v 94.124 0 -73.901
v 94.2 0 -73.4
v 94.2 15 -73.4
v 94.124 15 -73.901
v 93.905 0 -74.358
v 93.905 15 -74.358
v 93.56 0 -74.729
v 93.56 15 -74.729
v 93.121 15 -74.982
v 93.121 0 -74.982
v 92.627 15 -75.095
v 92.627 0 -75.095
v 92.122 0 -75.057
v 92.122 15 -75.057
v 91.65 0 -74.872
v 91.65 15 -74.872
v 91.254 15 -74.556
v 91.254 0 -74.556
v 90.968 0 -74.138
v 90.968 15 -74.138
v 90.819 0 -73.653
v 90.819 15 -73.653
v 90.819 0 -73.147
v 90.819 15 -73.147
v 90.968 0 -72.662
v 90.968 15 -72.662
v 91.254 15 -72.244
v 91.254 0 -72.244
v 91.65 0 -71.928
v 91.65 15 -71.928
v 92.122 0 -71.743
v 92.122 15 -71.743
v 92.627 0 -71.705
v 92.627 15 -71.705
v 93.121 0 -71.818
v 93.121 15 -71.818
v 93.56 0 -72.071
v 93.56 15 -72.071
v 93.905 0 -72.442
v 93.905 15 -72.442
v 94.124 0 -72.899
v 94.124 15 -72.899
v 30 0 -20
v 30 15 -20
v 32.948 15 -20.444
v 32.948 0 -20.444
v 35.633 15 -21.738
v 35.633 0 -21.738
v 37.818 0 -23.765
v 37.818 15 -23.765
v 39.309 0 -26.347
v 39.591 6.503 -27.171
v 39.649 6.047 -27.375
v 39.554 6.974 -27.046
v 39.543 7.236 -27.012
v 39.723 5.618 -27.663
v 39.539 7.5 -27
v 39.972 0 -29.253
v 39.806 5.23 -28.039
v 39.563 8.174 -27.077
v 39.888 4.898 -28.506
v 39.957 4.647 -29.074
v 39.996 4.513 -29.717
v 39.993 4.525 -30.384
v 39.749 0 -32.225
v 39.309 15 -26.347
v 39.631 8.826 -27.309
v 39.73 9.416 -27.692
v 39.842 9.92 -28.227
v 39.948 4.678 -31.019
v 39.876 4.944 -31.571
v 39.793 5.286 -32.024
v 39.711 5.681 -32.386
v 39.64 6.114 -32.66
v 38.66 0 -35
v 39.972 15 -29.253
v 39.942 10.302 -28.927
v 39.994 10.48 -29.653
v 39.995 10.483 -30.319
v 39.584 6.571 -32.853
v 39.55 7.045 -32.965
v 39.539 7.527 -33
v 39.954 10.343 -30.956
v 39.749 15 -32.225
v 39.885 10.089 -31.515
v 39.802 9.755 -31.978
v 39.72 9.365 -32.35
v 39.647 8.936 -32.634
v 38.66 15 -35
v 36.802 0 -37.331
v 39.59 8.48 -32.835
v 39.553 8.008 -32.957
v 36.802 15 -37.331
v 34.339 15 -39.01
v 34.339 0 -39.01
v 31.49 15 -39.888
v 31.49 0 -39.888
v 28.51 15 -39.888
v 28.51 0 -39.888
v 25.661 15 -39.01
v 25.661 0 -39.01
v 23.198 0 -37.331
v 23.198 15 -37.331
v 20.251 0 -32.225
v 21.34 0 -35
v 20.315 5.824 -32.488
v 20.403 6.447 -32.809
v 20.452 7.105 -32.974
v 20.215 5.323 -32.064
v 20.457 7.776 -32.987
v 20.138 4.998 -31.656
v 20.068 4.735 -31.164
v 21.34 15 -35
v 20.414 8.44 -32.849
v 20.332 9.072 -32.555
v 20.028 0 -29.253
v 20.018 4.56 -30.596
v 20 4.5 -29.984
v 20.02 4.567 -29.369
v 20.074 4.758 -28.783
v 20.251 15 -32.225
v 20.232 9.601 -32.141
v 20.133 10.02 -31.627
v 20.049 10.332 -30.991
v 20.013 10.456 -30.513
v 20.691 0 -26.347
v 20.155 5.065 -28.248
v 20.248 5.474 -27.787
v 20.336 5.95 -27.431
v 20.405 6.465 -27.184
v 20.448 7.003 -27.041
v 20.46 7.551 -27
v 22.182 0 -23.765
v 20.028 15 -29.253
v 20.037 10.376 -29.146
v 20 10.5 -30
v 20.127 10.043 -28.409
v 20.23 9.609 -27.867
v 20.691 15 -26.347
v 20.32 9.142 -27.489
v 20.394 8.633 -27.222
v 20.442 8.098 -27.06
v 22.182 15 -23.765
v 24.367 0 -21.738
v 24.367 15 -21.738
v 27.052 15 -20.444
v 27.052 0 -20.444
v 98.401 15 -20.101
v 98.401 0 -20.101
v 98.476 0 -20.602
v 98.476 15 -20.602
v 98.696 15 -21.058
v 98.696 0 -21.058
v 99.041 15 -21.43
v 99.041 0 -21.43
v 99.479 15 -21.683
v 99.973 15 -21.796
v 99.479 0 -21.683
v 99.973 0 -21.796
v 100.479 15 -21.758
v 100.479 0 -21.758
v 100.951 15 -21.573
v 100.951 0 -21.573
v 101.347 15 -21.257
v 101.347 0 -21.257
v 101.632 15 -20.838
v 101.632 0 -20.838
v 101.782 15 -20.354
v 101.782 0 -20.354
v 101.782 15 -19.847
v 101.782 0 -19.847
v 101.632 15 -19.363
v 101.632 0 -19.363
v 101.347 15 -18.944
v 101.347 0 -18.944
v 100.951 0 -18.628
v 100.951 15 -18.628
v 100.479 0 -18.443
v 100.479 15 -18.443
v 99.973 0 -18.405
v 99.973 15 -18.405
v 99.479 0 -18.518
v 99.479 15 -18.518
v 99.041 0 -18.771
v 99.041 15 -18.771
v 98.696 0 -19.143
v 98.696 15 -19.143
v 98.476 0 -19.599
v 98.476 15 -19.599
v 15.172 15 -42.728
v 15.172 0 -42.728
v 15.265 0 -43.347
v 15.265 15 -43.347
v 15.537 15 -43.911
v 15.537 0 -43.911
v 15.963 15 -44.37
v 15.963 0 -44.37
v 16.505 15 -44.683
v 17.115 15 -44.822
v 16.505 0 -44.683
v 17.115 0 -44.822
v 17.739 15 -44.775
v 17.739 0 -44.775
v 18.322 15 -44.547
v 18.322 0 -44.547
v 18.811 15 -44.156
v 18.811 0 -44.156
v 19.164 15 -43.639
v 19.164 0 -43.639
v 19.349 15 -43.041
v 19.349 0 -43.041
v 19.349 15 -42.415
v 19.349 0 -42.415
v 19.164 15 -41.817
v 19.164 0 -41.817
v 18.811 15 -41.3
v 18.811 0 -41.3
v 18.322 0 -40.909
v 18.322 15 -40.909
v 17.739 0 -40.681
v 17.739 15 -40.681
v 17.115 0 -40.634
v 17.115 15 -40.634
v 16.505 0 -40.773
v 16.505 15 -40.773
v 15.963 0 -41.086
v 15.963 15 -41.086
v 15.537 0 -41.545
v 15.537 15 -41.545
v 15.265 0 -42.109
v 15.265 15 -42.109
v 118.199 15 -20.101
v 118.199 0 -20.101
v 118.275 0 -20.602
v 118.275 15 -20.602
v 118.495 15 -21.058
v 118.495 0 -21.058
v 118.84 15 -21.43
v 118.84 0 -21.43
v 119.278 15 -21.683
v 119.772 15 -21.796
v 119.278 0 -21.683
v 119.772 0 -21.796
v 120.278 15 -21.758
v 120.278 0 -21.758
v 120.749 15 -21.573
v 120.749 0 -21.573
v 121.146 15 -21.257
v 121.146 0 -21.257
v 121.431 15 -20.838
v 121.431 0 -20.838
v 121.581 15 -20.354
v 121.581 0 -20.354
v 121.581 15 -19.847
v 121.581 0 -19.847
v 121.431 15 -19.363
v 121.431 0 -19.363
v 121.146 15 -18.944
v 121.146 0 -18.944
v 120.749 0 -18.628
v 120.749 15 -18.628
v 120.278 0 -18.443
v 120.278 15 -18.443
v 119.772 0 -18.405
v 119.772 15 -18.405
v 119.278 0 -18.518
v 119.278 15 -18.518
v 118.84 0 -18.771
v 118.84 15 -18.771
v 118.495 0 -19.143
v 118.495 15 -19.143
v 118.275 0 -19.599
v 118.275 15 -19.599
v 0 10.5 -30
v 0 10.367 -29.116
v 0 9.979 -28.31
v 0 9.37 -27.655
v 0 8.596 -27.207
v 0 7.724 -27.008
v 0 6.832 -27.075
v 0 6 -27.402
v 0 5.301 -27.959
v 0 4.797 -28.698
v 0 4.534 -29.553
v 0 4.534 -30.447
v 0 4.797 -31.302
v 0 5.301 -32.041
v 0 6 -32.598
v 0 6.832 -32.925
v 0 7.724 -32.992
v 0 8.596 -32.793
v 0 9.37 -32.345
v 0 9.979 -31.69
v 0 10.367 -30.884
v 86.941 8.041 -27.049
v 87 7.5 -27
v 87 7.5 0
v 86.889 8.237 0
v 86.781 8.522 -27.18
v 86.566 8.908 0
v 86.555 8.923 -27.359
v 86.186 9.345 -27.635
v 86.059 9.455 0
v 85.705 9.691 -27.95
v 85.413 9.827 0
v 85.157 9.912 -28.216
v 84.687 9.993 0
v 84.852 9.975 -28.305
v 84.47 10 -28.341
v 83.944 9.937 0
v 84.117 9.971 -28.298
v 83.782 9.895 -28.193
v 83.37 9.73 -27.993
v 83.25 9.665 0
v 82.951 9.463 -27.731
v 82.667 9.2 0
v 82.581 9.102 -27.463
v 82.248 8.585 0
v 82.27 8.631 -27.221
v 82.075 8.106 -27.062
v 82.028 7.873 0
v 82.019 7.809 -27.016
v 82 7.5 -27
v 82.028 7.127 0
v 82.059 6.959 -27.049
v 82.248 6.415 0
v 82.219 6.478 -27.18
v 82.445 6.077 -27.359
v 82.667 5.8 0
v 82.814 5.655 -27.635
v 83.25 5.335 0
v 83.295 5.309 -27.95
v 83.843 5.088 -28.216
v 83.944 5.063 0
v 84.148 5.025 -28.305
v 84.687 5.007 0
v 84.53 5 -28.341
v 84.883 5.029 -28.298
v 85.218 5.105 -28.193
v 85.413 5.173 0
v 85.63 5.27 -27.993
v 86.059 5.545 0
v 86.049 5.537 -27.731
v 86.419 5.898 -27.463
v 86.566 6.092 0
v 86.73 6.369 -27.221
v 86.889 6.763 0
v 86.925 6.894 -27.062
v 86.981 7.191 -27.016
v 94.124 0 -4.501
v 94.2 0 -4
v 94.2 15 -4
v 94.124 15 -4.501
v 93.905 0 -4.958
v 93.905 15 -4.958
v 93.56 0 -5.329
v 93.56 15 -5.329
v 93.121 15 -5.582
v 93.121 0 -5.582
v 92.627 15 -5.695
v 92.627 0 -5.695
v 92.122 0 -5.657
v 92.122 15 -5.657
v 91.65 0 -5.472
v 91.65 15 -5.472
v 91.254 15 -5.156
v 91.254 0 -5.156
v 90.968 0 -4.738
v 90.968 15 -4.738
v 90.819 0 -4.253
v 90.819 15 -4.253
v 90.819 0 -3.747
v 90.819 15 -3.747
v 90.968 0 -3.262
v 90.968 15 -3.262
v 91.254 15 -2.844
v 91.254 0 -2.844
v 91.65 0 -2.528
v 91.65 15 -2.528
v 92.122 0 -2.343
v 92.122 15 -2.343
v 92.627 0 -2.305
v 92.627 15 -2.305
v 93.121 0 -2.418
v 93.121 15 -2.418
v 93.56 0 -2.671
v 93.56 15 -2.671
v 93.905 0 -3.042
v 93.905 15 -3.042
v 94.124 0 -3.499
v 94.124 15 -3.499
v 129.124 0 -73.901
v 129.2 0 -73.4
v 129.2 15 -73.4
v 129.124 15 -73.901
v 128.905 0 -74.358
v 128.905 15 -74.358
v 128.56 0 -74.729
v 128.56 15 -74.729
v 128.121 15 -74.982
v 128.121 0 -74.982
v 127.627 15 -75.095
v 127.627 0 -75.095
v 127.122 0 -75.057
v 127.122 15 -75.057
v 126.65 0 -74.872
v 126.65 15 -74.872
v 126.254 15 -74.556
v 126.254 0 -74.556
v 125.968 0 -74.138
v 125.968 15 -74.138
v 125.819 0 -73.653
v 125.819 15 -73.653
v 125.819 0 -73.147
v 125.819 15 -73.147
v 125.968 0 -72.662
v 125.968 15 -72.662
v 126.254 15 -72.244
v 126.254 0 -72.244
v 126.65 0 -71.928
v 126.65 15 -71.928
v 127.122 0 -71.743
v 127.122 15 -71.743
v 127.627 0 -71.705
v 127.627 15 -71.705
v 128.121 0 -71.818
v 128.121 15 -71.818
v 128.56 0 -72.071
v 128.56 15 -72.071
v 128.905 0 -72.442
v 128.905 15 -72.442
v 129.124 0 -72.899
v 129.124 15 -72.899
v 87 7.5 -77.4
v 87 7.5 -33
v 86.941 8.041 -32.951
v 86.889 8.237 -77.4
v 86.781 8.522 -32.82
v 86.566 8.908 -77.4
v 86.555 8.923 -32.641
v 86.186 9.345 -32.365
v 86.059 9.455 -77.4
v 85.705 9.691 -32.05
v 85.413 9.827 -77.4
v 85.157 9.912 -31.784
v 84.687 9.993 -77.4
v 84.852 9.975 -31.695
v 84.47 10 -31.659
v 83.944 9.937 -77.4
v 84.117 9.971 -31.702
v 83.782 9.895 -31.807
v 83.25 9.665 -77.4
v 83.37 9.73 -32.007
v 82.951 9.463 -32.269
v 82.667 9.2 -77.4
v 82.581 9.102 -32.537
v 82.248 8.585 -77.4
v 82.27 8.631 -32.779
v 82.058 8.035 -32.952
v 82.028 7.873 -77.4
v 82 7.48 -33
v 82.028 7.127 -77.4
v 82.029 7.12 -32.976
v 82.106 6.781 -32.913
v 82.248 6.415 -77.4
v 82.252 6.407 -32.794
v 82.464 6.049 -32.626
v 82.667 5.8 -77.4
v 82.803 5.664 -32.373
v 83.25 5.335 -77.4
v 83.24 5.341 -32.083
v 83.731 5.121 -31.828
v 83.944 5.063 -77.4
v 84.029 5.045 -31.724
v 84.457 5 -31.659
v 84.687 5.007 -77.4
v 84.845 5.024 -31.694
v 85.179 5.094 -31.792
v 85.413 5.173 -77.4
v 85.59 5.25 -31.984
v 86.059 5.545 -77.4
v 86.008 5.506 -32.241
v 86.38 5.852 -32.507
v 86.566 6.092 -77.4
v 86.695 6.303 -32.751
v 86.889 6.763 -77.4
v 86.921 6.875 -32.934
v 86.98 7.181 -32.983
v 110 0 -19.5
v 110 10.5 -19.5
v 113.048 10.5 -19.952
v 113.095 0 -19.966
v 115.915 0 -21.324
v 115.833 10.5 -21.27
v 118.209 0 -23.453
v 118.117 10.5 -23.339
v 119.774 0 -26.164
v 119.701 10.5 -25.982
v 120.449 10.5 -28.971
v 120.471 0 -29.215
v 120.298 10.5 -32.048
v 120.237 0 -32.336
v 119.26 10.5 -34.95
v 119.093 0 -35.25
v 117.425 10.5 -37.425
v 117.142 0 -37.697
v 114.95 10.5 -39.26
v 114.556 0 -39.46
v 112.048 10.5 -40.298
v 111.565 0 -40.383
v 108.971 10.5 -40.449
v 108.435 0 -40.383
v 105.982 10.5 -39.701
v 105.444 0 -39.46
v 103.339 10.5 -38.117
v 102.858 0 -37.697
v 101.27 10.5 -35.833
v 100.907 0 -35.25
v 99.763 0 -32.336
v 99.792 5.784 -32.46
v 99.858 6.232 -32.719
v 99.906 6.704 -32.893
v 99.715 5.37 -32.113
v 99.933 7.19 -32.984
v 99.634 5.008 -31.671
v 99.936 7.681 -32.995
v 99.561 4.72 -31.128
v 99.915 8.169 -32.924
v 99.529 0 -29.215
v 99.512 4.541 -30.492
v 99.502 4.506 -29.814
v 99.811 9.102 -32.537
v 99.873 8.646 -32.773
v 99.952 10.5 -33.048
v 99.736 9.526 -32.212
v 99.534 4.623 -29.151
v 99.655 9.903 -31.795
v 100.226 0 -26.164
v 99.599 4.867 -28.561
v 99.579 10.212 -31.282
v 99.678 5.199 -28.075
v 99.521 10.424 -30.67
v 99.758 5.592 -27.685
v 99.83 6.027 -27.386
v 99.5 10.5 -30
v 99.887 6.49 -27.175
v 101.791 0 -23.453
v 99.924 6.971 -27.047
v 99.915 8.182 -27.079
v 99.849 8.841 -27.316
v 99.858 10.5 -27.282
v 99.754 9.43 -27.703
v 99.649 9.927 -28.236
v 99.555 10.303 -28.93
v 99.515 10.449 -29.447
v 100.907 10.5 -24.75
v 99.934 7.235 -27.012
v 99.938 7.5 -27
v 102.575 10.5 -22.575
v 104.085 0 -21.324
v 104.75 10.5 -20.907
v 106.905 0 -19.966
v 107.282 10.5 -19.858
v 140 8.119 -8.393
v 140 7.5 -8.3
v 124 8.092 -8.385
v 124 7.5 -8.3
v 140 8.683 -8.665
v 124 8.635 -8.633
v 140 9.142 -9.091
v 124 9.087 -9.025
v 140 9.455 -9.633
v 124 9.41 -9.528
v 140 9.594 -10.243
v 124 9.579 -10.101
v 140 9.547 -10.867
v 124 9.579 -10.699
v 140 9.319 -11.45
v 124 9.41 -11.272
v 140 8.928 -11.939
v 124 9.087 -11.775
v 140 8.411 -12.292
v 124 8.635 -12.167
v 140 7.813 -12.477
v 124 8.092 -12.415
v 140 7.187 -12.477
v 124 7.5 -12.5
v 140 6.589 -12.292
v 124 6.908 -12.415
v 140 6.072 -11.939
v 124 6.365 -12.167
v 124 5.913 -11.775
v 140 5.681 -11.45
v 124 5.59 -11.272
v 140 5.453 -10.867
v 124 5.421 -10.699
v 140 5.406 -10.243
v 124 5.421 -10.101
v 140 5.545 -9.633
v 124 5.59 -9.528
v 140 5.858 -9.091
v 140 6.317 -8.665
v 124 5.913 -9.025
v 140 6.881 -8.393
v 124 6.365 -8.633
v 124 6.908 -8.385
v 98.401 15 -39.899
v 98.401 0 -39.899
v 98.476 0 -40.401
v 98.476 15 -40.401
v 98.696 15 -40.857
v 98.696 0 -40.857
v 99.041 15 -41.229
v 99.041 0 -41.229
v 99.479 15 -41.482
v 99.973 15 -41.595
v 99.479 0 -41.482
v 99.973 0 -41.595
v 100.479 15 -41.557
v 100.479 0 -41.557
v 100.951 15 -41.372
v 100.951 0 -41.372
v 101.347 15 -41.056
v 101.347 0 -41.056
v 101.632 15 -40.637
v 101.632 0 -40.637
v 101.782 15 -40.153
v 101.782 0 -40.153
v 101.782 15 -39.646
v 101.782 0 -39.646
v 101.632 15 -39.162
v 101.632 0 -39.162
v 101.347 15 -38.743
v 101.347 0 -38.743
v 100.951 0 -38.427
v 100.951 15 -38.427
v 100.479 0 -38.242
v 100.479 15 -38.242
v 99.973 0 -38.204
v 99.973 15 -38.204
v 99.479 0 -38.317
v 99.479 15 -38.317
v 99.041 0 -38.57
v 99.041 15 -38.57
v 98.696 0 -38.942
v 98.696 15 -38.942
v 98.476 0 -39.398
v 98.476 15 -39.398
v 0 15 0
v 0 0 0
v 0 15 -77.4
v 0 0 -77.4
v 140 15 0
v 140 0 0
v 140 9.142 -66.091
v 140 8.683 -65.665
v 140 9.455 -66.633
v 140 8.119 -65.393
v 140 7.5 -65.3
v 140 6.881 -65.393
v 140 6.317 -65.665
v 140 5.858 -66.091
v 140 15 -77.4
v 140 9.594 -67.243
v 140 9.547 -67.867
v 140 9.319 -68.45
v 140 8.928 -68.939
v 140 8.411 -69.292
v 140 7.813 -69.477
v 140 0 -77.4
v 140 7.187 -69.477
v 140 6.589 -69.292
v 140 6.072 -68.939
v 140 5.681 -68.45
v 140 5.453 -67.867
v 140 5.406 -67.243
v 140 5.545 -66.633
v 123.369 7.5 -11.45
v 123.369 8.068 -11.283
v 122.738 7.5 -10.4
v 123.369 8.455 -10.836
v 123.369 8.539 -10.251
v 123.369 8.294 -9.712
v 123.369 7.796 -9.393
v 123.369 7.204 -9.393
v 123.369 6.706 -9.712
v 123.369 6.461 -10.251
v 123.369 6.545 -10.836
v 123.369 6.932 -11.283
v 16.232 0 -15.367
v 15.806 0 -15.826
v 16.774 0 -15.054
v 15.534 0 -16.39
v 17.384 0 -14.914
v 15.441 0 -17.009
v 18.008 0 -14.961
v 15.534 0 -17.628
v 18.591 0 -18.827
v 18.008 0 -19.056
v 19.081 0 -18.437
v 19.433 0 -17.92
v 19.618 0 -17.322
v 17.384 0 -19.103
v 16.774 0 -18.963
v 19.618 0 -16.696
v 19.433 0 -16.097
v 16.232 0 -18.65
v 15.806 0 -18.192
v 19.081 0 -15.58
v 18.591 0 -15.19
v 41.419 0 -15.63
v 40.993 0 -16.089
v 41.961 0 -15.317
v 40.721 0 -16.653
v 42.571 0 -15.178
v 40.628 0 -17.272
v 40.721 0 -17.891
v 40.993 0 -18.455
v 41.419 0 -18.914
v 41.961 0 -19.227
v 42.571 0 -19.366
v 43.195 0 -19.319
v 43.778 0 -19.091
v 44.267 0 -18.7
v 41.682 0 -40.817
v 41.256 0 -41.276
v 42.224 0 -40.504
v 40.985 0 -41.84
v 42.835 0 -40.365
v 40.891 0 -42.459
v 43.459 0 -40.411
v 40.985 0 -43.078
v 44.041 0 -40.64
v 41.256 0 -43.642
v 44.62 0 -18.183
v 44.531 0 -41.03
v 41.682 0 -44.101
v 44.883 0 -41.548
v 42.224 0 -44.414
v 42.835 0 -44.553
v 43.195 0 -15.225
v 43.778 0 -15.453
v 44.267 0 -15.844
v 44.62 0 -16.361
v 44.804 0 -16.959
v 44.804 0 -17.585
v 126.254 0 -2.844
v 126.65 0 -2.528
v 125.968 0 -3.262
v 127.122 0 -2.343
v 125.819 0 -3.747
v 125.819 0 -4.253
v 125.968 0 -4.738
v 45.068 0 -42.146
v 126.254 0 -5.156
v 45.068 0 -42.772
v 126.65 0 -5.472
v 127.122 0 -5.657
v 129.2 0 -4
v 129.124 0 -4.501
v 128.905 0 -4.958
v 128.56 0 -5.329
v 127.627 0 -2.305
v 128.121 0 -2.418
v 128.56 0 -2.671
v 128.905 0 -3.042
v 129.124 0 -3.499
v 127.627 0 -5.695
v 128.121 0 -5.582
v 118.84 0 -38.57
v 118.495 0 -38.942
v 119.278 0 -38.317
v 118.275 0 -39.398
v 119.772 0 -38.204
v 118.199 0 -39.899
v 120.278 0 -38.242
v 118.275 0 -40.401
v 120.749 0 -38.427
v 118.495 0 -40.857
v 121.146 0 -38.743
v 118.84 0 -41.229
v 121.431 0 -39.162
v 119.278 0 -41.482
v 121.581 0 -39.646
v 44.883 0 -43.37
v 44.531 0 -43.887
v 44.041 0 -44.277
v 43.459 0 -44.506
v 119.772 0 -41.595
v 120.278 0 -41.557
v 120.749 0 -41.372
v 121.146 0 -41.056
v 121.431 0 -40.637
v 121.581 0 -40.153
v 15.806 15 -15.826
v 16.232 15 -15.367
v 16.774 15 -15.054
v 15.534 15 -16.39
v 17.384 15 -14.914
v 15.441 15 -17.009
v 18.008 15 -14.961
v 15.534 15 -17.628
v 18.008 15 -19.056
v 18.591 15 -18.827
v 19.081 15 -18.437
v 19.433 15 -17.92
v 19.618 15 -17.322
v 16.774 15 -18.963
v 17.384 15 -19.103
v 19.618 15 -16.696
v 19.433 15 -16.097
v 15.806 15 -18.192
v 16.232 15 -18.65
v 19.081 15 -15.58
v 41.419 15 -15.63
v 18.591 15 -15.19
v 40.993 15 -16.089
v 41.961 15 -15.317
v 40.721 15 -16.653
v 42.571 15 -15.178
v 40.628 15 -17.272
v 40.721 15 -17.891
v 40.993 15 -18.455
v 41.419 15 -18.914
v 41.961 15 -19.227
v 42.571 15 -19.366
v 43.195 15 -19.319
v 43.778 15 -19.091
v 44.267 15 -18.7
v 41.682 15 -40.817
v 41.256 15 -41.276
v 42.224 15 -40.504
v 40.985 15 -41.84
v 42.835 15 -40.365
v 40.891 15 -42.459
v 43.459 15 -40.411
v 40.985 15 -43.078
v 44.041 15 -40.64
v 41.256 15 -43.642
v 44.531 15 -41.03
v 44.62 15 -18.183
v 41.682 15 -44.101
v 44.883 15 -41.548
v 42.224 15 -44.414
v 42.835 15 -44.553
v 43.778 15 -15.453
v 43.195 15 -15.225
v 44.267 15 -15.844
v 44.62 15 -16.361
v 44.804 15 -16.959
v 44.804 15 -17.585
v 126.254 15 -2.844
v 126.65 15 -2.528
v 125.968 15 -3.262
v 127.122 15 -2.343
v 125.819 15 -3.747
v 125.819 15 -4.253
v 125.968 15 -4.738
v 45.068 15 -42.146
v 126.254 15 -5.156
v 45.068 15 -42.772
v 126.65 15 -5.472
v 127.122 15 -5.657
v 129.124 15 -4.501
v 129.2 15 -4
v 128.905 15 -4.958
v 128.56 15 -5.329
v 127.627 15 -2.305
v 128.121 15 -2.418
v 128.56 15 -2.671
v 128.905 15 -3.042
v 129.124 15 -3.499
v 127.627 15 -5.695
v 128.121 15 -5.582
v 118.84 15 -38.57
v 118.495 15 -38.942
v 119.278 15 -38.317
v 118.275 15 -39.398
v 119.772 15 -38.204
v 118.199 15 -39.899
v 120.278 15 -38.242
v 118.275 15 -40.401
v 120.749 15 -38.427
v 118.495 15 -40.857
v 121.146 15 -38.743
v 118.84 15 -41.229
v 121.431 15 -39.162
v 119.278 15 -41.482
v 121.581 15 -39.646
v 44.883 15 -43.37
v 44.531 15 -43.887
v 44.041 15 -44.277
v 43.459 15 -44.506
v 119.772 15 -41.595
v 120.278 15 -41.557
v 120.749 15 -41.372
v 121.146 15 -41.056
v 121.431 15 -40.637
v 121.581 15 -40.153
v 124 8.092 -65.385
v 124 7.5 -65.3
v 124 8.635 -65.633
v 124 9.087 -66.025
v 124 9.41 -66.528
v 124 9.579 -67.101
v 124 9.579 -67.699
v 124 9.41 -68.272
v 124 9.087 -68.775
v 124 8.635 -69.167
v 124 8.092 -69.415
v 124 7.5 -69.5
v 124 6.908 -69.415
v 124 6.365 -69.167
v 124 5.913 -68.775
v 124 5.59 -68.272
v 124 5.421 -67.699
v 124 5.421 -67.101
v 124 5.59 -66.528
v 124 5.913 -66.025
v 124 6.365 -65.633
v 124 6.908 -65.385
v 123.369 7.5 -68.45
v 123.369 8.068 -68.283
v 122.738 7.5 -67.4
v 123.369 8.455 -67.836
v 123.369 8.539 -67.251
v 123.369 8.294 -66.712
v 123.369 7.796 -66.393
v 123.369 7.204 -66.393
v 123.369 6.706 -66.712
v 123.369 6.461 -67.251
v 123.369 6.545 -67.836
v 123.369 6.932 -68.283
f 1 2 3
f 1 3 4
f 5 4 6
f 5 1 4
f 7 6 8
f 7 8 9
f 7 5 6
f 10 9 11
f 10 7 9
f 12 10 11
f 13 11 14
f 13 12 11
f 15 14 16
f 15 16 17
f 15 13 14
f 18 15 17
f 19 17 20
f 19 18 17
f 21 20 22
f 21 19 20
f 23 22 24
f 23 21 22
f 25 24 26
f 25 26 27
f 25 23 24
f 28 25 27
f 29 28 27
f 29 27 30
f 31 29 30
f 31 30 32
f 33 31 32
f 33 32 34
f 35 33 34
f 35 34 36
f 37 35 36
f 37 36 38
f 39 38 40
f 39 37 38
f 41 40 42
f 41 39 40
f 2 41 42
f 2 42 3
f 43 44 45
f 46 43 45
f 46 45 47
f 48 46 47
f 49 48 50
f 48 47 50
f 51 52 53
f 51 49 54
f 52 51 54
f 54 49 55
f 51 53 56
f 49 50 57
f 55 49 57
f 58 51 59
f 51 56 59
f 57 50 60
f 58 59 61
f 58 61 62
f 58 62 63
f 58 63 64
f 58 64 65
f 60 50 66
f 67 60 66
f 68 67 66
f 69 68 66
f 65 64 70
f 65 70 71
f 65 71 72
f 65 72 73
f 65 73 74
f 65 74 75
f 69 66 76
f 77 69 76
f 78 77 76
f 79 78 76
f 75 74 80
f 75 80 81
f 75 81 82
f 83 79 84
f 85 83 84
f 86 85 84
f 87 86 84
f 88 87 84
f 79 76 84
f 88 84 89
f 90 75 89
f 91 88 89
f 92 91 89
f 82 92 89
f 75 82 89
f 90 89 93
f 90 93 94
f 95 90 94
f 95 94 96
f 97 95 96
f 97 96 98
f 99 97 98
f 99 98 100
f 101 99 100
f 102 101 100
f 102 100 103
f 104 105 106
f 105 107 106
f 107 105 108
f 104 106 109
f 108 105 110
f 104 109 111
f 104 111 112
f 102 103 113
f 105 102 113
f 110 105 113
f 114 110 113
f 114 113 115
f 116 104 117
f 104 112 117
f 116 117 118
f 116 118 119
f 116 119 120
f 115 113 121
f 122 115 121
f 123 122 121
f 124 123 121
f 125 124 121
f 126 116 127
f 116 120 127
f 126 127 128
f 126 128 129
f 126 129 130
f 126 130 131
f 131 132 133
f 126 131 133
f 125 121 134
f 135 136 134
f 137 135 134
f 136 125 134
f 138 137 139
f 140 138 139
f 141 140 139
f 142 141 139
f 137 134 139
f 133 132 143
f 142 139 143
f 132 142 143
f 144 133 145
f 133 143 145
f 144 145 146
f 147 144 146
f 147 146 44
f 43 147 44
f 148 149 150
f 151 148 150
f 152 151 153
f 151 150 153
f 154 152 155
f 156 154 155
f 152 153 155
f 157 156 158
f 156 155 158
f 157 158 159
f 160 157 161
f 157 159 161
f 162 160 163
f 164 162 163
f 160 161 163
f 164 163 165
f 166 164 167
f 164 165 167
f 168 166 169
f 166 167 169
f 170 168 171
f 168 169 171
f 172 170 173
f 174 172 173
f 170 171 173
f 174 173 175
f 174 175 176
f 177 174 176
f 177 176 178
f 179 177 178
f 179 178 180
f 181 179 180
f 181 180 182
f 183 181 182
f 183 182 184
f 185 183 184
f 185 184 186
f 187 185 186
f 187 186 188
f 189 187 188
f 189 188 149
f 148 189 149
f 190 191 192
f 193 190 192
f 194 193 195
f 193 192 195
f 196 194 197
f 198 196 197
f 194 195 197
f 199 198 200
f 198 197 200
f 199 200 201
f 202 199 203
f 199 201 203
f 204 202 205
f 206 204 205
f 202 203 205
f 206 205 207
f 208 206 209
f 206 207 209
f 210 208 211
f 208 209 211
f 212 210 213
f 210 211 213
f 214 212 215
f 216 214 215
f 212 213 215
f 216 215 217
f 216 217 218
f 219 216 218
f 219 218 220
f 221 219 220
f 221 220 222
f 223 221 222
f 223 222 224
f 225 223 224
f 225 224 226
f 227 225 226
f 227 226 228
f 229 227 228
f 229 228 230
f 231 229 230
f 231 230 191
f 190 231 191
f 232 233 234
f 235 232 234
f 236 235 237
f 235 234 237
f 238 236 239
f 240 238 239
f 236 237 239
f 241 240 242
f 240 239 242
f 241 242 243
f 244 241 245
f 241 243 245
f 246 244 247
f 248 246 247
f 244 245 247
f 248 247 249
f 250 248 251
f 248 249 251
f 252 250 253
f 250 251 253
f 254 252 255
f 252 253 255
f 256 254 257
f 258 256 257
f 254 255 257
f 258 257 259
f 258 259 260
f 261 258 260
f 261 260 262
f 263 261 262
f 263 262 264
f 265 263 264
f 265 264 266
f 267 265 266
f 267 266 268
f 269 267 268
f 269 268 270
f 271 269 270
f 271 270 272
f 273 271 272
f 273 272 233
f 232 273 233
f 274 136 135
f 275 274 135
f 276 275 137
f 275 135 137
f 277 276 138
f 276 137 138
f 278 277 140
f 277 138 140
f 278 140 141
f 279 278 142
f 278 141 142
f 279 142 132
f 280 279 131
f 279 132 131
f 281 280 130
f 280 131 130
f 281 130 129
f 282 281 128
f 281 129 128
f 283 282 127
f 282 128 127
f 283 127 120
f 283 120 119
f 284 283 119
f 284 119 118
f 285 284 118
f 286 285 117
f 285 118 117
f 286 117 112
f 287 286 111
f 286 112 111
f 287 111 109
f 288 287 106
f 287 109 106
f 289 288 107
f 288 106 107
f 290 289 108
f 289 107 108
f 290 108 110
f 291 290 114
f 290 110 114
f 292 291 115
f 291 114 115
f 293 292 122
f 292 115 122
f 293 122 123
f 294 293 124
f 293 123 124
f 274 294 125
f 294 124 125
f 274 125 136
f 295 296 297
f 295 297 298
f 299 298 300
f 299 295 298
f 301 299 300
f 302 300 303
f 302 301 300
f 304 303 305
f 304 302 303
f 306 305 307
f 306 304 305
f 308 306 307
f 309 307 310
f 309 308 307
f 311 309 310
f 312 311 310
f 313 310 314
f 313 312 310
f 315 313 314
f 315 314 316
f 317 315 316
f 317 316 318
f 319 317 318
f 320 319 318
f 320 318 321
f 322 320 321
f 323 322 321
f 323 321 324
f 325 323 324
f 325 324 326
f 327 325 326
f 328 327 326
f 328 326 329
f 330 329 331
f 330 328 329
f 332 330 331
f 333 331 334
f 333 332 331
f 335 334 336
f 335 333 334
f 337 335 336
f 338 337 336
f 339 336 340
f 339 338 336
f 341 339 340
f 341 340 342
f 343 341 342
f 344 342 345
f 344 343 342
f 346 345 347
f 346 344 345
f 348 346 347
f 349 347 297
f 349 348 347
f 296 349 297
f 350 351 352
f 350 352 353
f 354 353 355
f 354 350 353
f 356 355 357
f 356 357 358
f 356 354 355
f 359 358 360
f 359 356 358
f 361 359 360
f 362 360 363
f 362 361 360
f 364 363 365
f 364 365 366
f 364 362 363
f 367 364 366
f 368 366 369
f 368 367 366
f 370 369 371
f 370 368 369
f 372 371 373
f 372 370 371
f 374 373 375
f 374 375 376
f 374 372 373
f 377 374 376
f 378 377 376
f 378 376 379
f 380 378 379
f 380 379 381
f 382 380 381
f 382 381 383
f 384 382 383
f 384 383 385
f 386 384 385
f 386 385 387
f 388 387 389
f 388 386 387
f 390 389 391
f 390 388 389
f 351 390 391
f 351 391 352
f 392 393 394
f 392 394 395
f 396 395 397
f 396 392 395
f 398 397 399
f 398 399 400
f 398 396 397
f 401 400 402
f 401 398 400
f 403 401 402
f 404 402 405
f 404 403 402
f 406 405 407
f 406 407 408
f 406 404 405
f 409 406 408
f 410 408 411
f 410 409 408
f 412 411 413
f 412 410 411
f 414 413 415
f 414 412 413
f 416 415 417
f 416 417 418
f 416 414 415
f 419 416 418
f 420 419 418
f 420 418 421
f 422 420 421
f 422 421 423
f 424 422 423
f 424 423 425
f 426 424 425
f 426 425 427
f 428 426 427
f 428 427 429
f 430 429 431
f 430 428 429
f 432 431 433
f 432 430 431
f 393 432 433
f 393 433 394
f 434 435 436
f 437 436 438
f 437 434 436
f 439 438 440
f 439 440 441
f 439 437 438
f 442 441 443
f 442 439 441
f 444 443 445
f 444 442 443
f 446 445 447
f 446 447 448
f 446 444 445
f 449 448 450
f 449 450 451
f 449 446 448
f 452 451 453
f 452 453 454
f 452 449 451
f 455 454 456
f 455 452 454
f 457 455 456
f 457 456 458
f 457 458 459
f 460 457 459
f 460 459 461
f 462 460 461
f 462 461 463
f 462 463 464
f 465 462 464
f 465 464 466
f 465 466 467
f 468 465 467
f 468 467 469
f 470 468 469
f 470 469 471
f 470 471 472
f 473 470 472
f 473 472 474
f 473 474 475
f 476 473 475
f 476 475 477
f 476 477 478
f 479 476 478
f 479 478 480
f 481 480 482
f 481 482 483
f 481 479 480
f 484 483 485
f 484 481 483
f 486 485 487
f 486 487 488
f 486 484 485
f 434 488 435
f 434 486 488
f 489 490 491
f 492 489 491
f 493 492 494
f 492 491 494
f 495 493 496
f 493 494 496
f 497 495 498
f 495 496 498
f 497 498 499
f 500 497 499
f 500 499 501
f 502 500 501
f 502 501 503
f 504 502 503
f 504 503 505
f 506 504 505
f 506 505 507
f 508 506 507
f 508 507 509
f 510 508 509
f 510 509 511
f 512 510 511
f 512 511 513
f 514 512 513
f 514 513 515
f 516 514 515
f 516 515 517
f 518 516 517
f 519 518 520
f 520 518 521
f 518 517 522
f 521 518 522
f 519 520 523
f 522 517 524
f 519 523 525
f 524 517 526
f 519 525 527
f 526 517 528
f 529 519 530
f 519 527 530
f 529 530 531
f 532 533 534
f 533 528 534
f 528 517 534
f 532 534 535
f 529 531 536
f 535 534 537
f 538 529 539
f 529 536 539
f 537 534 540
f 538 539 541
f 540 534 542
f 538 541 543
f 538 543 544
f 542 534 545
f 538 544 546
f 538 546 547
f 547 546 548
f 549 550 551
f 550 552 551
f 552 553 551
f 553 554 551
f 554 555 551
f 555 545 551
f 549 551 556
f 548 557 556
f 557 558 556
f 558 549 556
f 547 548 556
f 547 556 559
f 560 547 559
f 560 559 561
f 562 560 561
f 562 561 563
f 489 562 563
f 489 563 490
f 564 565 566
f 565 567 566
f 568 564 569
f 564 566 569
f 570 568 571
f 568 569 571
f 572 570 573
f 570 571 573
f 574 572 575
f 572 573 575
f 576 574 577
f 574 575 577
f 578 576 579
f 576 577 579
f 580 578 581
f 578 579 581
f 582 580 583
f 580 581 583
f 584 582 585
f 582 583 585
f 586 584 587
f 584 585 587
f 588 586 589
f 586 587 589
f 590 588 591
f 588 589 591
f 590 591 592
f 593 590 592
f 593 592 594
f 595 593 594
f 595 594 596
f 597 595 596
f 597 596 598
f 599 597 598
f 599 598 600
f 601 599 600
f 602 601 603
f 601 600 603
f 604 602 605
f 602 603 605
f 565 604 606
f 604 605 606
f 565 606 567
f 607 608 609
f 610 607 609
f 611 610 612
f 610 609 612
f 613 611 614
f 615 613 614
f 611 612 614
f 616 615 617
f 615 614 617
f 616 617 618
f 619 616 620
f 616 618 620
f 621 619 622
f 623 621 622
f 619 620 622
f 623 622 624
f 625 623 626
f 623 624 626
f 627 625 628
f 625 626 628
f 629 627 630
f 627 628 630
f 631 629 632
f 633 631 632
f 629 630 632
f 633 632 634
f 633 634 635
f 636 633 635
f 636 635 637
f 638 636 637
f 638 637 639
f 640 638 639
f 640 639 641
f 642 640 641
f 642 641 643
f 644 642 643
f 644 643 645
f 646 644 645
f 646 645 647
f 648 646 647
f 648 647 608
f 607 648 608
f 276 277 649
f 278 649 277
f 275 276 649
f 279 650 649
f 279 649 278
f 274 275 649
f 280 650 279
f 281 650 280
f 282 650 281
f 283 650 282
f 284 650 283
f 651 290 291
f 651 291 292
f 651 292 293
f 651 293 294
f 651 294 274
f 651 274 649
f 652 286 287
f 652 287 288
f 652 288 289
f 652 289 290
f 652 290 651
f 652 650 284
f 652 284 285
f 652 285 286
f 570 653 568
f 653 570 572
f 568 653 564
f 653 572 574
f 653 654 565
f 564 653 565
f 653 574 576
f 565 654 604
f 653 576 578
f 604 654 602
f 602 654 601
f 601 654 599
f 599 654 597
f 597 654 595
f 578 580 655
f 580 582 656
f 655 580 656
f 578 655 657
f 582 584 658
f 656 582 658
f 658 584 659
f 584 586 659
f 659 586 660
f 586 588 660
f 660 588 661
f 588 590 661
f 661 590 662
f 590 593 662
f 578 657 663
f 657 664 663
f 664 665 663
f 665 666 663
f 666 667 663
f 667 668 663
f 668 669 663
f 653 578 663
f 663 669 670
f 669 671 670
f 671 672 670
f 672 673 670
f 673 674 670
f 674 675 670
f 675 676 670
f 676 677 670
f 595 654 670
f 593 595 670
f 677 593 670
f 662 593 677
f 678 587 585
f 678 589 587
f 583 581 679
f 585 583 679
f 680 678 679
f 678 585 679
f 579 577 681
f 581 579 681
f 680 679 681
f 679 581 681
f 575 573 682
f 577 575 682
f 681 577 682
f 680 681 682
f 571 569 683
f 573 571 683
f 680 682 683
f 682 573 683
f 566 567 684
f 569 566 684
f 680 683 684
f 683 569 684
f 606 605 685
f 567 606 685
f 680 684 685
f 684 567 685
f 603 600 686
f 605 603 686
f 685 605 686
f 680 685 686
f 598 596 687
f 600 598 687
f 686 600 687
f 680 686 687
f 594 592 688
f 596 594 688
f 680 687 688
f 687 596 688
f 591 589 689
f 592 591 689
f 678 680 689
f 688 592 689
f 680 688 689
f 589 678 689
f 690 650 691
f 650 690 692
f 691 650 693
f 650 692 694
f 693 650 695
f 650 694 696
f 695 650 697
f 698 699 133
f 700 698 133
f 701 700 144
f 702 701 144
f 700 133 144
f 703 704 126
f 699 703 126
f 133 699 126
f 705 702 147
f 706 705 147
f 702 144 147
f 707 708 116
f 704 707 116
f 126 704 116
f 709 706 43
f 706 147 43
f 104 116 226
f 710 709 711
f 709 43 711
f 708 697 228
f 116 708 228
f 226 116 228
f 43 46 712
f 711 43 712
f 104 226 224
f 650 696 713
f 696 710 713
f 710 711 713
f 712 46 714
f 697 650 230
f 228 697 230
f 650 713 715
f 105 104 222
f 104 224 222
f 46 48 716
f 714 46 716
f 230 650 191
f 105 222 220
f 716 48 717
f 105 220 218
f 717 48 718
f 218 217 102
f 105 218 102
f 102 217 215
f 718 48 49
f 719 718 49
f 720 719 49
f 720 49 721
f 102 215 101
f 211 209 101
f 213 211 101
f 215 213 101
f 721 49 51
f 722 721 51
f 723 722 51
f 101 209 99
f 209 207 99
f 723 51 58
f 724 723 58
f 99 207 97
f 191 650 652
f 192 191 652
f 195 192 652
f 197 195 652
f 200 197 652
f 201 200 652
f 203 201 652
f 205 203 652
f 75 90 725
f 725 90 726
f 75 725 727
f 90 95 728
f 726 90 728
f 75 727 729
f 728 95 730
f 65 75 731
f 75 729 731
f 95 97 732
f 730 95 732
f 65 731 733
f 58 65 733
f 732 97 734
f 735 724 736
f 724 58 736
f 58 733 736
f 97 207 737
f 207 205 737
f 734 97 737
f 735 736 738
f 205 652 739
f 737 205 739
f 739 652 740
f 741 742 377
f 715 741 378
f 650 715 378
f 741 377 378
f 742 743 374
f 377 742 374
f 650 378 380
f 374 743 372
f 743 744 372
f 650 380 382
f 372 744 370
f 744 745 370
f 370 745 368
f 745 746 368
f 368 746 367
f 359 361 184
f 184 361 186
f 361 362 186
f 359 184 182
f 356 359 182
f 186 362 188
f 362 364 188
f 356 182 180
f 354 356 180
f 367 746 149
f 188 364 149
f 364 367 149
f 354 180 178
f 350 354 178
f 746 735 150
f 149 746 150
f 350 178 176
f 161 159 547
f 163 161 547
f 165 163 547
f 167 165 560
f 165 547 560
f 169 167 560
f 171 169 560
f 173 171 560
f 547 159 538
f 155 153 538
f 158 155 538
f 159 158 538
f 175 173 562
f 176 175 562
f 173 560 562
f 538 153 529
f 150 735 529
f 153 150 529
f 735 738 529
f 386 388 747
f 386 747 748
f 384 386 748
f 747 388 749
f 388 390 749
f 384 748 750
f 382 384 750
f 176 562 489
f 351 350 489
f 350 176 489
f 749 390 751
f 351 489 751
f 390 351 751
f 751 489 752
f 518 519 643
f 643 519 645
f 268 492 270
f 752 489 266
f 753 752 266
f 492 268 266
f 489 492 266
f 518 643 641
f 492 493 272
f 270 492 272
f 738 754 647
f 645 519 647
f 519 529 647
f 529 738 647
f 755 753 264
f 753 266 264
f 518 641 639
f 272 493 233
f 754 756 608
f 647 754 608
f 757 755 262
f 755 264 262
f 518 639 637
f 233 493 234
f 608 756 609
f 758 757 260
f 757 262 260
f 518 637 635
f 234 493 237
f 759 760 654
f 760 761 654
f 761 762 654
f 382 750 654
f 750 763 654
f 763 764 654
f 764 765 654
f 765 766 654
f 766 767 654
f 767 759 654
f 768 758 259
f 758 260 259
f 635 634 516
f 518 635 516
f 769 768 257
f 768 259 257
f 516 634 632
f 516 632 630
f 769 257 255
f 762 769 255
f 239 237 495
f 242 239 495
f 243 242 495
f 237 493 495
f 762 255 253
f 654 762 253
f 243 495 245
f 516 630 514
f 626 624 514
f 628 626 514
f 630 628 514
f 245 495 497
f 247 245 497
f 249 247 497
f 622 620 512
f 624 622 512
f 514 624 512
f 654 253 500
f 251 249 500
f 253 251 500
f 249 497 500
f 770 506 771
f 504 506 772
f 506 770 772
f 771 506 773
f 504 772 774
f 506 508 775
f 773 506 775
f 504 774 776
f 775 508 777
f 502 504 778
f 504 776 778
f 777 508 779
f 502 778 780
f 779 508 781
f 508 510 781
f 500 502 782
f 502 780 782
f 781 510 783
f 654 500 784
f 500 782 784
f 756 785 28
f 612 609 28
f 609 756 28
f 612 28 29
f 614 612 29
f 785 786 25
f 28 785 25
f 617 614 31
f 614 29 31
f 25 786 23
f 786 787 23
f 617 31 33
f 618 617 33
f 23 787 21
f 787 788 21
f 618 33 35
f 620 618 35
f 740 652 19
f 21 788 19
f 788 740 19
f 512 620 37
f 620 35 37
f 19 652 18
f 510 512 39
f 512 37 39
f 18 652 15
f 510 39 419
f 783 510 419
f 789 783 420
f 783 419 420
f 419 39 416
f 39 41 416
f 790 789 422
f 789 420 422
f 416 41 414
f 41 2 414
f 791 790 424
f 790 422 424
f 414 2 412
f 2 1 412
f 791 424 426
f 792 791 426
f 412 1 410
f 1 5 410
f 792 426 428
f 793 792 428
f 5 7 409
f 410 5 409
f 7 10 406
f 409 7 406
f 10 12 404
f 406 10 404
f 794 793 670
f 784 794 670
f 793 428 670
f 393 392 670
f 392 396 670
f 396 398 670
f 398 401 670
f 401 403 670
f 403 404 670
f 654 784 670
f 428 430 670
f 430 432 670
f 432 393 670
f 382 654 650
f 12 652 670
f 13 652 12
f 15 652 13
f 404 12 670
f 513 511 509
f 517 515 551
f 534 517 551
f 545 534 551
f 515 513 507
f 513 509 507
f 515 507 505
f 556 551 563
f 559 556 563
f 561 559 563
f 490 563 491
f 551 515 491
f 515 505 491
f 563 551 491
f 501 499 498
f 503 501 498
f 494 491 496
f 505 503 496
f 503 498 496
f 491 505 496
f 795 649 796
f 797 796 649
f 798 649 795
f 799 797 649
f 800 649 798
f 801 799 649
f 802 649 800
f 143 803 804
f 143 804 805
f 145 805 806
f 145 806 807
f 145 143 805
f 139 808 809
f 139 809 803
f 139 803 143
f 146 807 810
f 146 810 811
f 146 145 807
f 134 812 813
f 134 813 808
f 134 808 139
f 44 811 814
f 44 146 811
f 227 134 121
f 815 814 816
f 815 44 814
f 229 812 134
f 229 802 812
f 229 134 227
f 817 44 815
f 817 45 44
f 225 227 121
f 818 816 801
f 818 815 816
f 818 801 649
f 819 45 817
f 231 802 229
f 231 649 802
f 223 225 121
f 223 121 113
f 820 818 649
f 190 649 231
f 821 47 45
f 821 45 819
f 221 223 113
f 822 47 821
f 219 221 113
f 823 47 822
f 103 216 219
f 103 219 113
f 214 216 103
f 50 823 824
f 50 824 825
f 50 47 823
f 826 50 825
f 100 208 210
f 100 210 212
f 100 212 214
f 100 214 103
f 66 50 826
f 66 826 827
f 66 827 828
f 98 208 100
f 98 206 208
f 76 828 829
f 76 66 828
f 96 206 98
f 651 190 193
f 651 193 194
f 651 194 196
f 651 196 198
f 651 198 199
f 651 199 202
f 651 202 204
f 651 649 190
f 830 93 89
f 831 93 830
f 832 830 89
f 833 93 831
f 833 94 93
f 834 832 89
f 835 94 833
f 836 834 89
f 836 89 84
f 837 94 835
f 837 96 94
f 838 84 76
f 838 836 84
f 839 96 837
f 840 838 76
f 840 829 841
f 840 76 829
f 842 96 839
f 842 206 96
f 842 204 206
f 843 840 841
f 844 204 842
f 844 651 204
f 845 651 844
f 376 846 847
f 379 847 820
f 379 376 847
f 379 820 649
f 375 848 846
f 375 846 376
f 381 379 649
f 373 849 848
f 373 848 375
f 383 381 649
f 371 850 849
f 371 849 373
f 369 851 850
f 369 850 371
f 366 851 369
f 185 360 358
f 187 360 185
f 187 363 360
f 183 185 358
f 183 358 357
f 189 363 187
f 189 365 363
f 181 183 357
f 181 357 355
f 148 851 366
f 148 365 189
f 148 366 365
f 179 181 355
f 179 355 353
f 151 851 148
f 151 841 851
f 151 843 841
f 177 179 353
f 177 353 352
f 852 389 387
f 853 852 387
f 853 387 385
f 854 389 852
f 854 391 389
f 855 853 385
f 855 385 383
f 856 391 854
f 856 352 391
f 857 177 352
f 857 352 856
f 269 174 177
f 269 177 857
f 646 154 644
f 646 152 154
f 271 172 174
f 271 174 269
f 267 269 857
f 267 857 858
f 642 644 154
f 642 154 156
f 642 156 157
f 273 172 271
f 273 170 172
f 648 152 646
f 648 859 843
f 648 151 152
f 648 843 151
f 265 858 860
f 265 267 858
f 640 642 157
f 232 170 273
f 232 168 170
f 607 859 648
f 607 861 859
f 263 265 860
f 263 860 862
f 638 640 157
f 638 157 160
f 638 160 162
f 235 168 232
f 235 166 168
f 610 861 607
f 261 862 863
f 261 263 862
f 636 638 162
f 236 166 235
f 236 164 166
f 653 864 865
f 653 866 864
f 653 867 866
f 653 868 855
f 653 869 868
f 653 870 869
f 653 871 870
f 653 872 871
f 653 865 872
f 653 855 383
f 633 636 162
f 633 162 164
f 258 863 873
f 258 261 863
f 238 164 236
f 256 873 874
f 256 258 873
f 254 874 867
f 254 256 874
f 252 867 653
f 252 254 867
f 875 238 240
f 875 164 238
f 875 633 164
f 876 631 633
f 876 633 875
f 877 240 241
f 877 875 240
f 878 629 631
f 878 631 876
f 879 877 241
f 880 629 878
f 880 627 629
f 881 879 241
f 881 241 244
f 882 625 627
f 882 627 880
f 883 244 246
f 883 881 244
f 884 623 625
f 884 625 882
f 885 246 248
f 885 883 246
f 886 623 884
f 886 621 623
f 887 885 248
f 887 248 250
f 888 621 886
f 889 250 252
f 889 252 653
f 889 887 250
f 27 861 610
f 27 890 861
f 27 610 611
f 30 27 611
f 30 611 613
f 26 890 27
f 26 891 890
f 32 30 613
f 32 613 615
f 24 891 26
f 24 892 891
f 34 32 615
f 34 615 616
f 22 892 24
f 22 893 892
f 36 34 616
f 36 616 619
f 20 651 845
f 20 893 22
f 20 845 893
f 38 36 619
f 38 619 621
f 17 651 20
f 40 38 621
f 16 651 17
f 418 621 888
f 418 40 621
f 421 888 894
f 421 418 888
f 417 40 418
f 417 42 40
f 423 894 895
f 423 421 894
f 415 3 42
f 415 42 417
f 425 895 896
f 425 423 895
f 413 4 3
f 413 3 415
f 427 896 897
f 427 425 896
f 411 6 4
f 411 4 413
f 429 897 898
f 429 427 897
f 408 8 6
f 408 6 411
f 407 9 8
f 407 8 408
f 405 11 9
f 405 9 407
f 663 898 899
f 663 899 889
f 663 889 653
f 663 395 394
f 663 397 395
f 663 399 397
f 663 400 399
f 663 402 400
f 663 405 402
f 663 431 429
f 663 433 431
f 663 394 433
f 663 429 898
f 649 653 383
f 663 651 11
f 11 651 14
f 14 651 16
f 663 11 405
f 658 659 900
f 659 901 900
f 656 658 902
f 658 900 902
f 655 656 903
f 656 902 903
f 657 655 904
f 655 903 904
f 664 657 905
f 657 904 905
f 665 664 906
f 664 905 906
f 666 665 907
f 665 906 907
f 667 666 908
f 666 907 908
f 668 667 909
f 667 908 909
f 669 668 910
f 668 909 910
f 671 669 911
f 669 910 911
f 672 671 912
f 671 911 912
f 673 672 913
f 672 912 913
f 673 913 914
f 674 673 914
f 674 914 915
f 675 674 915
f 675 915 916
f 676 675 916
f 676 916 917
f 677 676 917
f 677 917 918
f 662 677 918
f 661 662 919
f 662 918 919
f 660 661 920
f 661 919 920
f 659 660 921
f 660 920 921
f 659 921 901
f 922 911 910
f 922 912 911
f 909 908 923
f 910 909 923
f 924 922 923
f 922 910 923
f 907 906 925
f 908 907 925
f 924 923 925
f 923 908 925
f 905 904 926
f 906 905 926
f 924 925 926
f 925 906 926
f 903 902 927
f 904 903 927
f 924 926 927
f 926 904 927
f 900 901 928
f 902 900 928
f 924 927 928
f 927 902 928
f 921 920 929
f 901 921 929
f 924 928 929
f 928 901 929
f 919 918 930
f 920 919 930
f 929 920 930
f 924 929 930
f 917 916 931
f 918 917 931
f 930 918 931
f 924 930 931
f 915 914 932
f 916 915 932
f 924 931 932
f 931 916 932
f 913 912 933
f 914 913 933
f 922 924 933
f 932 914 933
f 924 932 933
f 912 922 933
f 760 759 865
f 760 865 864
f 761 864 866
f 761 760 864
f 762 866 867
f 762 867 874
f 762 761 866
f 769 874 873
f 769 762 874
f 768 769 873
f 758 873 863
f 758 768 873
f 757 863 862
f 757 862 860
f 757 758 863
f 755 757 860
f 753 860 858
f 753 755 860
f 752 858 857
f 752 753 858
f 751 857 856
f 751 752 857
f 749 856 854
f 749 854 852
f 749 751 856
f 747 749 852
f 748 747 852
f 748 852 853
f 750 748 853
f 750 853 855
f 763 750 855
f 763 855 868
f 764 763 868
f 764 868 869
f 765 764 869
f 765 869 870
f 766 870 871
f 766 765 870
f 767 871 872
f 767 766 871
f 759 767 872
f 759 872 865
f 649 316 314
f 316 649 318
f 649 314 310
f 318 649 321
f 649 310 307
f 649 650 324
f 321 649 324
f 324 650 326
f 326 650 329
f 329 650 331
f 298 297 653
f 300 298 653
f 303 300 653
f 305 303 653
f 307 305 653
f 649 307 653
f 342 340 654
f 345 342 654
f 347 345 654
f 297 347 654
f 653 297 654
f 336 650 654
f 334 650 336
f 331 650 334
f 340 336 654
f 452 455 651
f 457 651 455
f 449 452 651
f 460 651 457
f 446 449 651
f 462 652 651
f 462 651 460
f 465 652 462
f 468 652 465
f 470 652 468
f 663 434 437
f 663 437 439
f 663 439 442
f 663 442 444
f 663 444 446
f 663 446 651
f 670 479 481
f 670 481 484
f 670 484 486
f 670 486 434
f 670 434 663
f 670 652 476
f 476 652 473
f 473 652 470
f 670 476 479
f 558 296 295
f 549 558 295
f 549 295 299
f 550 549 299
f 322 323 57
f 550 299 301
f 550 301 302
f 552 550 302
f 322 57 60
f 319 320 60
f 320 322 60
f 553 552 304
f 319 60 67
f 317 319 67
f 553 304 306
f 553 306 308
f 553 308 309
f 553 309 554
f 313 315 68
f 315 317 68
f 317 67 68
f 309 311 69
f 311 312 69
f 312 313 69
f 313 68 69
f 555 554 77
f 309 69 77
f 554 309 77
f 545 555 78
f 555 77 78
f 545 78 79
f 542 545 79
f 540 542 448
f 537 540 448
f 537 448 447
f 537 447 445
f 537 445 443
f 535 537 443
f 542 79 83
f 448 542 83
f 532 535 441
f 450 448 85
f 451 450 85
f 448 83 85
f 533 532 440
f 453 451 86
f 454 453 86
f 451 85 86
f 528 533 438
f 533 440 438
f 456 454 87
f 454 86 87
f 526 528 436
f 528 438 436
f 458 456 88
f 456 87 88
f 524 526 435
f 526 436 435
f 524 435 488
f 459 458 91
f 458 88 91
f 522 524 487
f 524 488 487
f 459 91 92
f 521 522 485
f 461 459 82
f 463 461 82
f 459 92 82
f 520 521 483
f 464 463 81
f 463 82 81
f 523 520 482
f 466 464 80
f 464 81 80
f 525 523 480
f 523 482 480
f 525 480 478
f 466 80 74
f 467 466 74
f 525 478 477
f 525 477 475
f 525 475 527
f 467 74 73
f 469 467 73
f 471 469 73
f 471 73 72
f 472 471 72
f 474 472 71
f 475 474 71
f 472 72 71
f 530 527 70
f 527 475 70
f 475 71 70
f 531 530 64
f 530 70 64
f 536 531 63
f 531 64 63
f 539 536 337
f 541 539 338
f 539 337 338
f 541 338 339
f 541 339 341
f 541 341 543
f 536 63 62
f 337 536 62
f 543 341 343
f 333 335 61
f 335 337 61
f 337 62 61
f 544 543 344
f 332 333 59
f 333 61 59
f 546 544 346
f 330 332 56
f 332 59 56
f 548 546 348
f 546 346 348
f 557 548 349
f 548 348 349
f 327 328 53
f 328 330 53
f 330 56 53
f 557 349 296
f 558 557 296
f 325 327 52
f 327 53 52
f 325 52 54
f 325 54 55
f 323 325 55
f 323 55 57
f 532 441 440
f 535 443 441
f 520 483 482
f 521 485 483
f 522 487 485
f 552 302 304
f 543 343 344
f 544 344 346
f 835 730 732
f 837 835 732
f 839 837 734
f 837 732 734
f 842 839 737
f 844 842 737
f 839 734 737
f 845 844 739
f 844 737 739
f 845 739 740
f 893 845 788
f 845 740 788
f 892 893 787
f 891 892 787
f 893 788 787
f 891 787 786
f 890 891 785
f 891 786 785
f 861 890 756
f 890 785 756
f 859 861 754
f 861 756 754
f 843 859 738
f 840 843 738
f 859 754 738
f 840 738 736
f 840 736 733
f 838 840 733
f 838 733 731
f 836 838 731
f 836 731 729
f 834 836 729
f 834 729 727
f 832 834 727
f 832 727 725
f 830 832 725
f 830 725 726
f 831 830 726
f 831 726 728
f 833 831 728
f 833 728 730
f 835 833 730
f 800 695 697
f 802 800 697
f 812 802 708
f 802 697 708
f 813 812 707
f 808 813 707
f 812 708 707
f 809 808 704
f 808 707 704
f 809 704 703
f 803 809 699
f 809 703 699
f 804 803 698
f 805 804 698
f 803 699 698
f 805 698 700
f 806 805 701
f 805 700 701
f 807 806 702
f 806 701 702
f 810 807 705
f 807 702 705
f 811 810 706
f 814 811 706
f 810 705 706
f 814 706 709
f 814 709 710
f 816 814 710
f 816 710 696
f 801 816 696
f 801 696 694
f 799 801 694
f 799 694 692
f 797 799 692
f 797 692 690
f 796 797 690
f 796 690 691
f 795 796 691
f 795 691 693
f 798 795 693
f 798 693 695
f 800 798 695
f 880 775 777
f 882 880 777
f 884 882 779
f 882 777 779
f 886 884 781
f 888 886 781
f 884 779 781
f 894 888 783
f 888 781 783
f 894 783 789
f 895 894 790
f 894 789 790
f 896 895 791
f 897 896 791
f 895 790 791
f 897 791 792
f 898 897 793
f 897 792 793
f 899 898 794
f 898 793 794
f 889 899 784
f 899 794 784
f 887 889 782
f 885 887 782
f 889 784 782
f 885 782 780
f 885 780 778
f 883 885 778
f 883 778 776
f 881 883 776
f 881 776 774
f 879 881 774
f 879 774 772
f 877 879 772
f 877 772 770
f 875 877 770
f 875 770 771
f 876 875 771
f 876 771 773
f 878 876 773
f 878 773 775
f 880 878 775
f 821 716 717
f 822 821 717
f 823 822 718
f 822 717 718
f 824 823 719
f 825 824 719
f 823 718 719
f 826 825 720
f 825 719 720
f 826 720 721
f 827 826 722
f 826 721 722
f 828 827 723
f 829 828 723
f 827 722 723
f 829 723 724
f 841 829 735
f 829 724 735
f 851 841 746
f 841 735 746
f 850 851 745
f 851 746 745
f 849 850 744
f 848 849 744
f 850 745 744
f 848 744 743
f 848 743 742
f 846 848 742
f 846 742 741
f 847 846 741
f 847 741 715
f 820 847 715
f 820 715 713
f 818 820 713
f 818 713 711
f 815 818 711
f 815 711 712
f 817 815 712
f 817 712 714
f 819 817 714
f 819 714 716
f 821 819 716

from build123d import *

# Parameters (mm, degrees)
SKETCH_1_W                 = 140
SKETCH_1_H                 = 77.4
EXTRUDE_1_DEPTH            = 15
SKETCH_6_R                 = 10.5
CUT_EXTRUDE_4_DEPTH        = 161.315345491
M5X0_8_1_D                 = 4.2
M5X0_8_1_DEPTH             = 16
M5X0_8_1_TIP               = 1.2618073
SKETCH_9_R                 = 10
CUT_EXTRUDE_6_DEPTH        = 161.67283529
M5X0_8_2_D                 = 4.2
HOLE_WIZARD_M3_1_D         = 3.4
M6X1_0_START               = -77.4
M6X1_0_3_OUTLINE_R         = 2.5
M6X1_0_3_DEPTH             = 77.4
HOLE_WIZARD_M3_2_OUTLINE_R = 1.7
HOLE_WIZARD_M3_2_DEPTH     = 15
M7X1_0_4_OUTLINE_W         = 3
M7X1_0_4_OUTLINE_H         = 20.46087378
CUT_EXTRUDE_7_REACH        = 137.336
SKETCH_27_R                = 3


# Read off the part's stored shape, not the designer's step: M6x1.0 ねじ穴3, M3 すきま穴2, M7x1.0 ねじ穴4
with BuildPart() as part:
    # ｽｹｯﾁ1 → ﾎﾞｽ - 押し出し1 (new body)
    with BuildSketch(Plane(origin=(0, 0, 0), x_dir=(1, 0, 0), z_dir=(0, 1, 0))):
        with Locations((70, 38.7)):
            Rectangle(SKETCH_1_W, SKETCH_1_H)
    extrude(amount=EXTRUDE_1_DEPTH)

    # ｽｹｯﾁ6 → ｶｯﾄ - 押し出し4 (cut, through all)
    with BuildSketch(Plane(origin=(0, 10.5, 0), x_dir=(1, 0, 0), z_dir=(0, 1, 0))):
        with Locations(Location((110, 30, 0), (0, 0, 270))):
            Circle(SKETCH_6_R)
    extrude(amount=-CUT_EXTRUDE_4_DEPTH, mode=Mode.SUBTRACT)

    # M5x0.8 ねじ穴1
    with Locations(Plane(origin=(140, 0, 0), x_dir=(0, 0, -1), z_dir=(1, 0, 0))):
        with Locations((10.4, 7.5), (67.4, 7.5)):
            Hole(M5X0_8_1_D / 2, depth=M5X0_8_1_DEPTH)
            with Locations((0, 0, -(M5X0_8_1_DEPTH + M5X0_8_1_TIP / 2))):  # 118° drill point
                Cone(0, M5X0_8_1_D / 2, M5X0_8_1_TIP, mode=Mode.SUBTRACT)

    # ｽｹｯﾁ9 → ｶｯﾄ - 押し出し6 (cut, through all)
    with BuildSketch(Plane(origin=(0, 15, 0), x_dir=(1, 0, 0), z_dir=(0, 1, 0))):
        with Locations(Location((30, 30, 0), (0, 0, 270))):
            Circle(SKETCH_9_R)
    extrude(amount=-CUT_EXTRUDE_6_DEPTH, mode=Mode.SUBTRACT)

    # M5x0.8 ねじ穴2 (through all)
    with Locations(Plane(origin=(0, 15, 0), x_dir=(1, 0, 0), z_dir=(0, 1, 0))):
        with Locations((42.991460674, 42.458810119), (17.272077939, 42.727922061), (42.727922061, 17.272077939), (17.541189881, 17.008539326)):
            Hole(M5X0_8_2_D / 2)

    # M3 すきま穴1 (through all)
    with Locations(Plane(origin=(0, 15, 0), x_dir=(1, 0, 0), z_dir=(0, 1, 0))):
        with Locations((119.899494937, 39.899494937), (119.899494937, 20.100505063), (100.100505063, 20.100505063), (100.100505063, 39.899494937)):
            Hole(HOLE_WIZARD_M3_1_D / 2)

    # M6x1.0 ねじ穴3 outline → M6x1.0 ねじ穴3 (cut)
    with BuildSketch(Plane.XY.offset(M6X1_0_START)):
        with Locations((84.5, 7.5)):
            Circle(M6X1_0_3_OUTLINE_R)
    extrude(amount=M6X1_0_3_DEPTH, mode=Mode.SUBTRACT)

    # M3 すきま穴2 outline → M3 すきま穴2 (cut)
    with BuildSketch(Plane(origin=(0, 0, 0), x_dir=(1, 0, 0), z_dir=(0, 1, 0))):
        with Locations((92.5, 73.4)):
            Circle(HOLE_WIZARD_M3_2_OUTLINE_R)
        with Locations((127.5, 73.4)):
            Circle(HOLE_WIZARD_M3_2_OUTLINE_R)
        with Locations((92.5, 4)):
            Circle(HOLE_WIZARD_M3_2_OUTLINE_R)
        with Locations((127.5, 4)):
            Circle(HOLE_WIZARD_M3_2_OUTLINE_R)
    extrude(amount=HOLE_WIZARD_M3_2_DEPTH, mode=Mode.SUBTRACT)

    # M7x1.0 ねじ穴4 outline → M7x1.0 ねじ穴4 (revolve, cut)
    with BuildSketch(Plane(origin=(0, 7.5, -30), x_dir=(0, 1, 0), z_dir=(0, 0, -1))):
        with Locations((1.5, 10.23043689)):
            Rectangle(M7X1_0_4_OUTLINE_W, M7X1_0_4_OUTLINE_H)
    revolve(axis=Axis((0, 7.5, -30), (1, 0, 0)), mode=Mode.SUBTRACT)

    # ｽｹｯﾁ27 → ｶｯﾄ - 押し出し7 (cut, up to next)
    with BuildSketch(Plane.ZY.offset(-30), mode=Mode.PRIVATE) as cut_extrude_7_sk1:
        with Locations((-30, 7.5)):
            Circle(SKETCH_27_R)
    cut_extrude_7_tool1 = extrude(cut_extrude_7_sk1.sketch, amount=-CUT_EXTRUDE_7_REACH, mode=Mode.PRIVATE) & part.part
    add(cut_extrude_7_tool1.solids().sort_by_distance((30, 7.5, -30))[0], mode=Mode.SUBTRACT)


solid = part.part
